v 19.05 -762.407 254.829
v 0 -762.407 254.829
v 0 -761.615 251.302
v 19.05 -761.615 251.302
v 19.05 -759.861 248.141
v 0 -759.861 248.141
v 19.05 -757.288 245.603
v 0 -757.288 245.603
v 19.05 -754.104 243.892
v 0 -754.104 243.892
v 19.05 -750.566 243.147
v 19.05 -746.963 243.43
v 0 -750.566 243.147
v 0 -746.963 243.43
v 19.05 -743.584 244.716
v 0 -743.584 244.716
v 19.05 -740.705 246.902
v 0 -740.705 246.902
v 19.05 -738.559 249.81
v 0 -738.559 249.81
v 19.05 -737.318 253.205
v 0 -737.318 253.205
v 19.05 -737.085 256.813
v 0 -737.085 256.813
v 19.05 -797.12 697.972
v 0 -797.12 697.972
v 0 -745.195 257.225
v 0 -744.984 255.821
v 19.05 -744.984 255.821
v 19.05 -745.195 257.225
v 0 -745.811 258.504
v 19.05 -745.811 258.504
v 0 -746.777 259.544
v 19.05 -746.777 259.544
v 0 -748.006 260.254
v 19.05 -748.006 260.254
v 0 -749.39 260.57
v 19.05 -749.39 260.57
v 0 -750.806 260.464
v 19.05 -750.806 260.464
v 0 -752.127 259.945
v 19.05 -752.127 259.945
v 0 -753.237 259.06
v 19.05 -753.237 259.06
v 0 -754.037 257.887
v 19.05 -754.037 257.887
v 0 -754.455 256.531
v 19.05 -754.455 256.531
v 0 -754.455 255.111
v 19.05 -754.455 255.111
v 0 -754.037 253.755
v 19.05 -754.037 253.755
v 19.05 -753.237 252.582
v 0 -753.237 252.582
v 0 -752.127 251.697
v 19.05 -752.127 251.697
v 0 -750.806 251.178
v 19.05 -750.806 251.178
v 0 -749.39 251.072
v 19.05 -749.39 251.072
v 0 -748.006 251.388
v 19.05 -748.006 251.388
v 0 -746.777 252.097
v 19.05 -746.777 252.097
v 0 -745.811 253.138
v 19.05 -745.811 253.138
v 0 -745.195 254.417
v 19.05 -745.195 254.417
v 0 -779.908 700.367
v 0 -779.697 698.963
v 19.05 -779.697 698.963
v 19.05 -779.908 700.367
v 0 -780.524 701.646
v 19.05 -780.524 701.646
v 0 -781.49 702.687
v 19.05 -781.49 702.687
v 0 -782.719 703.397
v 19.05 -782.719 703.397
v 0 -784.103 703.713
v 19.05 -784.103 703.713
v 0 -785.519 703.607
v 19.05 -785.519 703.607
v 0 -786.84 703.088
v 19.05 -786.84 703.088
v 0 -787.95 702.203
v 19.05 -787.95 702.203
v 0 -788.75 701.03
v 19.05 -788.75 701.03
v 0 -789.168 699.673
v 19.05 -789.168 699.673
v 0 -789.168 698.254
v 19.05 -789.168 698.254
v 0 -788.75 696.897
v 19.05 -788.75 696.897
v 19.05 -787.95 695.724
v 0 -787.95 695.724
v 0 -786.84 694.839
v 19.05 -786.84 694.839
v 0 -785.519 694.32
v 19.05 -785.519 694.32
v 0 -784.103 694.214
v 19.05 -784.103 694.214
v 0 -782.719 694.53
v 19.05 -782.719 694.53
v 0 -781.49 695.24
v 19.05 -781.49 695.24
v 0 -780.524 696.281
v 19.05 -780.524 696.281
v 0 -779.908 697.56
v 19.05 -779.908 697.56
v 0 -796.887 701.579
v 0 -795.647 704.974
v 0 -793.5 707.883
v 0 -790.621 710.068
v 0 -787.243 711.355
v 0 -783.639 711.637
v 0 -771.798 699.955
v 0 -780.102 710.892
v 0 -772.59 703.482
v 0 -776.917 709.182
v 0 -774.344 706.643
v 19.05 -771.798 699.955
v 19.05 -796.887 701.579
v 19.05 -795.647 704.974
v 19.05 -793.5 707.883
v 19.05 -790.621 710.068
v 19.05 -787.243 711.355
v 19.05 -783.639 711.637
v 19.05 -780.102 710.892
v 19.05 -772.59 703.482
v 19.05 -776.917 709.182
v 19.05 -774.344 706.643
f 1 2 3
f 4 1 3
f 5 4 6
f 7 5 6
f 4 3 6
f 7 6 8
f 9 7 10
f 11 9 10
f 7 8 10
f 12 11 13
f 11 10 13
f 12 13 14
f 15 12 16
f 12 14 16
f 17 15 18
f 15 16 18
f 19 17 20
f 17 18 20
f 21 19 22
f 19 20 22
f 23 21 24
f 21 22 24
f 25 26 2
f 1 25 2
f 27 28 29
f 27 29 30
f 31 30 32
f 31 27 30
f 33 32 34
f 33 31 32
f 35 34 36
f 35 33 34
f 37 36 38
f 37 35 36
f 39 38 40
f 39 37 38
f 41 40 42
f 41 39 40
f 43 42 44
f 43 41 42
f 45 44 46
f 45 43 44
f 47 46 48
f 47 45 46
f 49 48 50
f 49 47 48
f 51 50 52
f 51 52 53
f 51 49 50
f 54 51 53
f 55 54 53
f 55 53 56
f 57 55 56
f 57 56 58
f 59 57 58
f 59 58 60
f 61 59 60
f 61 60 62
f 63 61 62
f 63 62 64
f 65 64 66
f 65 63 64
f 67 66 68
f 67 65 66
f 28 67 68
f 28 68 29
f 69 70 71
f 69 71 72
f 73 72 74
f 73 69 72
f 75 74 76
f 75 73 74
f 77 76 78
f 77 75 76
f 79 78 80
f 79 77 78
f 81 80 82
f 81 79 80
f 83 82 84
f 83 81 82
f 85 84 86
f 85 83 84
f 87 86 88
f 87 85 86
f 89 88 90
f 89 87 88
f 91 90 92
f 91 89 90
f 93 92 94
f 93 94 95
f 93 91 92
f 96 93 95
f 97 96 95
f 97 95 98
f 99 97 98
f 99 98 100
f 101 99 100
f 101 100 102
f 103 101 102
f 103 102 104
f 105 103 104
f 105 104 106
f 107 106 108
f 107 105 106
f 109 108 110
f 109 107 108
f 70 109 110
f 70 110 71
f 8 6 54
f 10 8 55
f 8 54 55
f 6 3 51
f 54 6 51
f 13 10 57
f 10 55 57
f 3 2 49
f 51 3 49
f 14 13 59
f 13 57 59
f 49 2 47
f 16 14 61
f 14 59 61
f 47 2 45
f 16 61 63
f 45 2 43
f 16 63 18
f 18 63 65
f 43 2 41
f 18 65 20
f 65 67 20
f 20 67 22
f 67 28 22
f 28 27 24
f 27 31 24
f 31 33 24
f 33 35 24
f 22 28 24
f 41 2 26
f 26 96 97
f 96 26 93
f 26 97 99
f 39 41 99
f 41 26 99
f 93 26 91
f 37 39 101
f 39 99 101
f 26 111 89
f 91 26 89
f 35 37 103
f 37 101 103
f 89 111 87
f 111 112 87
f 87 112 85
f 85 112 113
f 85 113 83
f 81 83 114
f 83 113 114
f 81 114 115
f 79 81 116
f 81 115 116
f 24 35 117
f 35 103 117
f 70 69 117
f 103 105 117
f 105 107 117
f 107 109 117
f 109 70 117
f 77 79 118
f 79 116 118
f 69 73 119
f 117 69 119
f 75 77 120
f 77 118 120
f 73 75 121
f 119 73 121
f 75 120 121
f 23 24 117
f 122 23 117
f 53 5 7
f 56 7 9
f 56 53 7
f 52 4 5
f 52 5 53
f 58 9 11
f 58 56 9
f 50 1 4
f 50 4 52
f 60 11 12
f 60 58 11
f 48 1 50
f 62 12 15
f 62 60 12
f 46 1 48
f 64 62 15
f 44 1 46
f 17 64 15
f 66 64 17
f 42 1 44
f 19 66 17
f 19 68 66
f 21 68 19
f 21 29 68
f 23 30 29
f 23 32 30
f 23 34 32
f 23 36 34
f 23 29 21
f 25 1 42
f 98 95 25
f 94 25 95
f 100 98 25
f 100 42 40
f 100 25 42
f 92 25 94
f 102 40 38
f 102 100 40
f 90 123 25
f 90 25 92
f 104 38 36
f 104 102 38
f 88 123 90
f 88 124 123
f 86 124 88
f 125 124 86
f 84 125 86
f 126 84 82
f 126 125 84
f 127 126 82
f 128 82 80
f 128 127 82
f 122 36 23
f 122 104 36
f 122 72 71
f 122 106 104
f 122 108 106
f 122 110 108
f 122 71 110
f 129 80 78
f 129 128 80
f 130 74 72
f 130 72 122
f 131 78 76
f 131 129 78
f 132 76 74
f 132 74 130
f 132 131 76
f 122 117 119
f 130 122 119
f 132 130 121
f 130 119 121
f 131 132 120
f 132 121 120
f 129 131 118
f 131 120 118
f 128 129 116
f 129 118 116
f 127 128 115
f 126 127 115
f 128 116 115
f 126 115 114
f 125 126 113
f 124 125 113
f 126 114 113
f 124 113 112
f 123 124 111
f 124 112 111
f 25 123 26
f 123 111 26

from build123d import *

# Parameters (mm, degrees)
F2_R     = 4.7625
F3_DEPTH = 19.05


with BuildPart() as f3:
    # F2 (on Right) → F3 (new body)
    with BuildSketch(Plane.YZ):
        with BuildLine():
            ThreePointArc((-771.797877, 699.955234), (-785.45089, 711.62465), (-797.120305, 697.971637))
            Line((-797.120305, 697.971637), (-762.407361, 254.829153))
            ThreePointArc((-762.407361, 254.829153), (-748.754349, 243.159737), (-737.084934, 256.81275))
            Line((-737.084934, 256.81275), (-771.797877, 699.955234))
        make_face()
        with Locations((-749.746147, 255.820951)):
            Circle(F2_R, mode=Mode.SUBTRACT)
        with Locations((-784.459091, 698.963436)):
            Circle(F2_R, mode=Mode.SUBTRACT)
    extrude(amount=F3_DEPTH)


solid = f3.part
